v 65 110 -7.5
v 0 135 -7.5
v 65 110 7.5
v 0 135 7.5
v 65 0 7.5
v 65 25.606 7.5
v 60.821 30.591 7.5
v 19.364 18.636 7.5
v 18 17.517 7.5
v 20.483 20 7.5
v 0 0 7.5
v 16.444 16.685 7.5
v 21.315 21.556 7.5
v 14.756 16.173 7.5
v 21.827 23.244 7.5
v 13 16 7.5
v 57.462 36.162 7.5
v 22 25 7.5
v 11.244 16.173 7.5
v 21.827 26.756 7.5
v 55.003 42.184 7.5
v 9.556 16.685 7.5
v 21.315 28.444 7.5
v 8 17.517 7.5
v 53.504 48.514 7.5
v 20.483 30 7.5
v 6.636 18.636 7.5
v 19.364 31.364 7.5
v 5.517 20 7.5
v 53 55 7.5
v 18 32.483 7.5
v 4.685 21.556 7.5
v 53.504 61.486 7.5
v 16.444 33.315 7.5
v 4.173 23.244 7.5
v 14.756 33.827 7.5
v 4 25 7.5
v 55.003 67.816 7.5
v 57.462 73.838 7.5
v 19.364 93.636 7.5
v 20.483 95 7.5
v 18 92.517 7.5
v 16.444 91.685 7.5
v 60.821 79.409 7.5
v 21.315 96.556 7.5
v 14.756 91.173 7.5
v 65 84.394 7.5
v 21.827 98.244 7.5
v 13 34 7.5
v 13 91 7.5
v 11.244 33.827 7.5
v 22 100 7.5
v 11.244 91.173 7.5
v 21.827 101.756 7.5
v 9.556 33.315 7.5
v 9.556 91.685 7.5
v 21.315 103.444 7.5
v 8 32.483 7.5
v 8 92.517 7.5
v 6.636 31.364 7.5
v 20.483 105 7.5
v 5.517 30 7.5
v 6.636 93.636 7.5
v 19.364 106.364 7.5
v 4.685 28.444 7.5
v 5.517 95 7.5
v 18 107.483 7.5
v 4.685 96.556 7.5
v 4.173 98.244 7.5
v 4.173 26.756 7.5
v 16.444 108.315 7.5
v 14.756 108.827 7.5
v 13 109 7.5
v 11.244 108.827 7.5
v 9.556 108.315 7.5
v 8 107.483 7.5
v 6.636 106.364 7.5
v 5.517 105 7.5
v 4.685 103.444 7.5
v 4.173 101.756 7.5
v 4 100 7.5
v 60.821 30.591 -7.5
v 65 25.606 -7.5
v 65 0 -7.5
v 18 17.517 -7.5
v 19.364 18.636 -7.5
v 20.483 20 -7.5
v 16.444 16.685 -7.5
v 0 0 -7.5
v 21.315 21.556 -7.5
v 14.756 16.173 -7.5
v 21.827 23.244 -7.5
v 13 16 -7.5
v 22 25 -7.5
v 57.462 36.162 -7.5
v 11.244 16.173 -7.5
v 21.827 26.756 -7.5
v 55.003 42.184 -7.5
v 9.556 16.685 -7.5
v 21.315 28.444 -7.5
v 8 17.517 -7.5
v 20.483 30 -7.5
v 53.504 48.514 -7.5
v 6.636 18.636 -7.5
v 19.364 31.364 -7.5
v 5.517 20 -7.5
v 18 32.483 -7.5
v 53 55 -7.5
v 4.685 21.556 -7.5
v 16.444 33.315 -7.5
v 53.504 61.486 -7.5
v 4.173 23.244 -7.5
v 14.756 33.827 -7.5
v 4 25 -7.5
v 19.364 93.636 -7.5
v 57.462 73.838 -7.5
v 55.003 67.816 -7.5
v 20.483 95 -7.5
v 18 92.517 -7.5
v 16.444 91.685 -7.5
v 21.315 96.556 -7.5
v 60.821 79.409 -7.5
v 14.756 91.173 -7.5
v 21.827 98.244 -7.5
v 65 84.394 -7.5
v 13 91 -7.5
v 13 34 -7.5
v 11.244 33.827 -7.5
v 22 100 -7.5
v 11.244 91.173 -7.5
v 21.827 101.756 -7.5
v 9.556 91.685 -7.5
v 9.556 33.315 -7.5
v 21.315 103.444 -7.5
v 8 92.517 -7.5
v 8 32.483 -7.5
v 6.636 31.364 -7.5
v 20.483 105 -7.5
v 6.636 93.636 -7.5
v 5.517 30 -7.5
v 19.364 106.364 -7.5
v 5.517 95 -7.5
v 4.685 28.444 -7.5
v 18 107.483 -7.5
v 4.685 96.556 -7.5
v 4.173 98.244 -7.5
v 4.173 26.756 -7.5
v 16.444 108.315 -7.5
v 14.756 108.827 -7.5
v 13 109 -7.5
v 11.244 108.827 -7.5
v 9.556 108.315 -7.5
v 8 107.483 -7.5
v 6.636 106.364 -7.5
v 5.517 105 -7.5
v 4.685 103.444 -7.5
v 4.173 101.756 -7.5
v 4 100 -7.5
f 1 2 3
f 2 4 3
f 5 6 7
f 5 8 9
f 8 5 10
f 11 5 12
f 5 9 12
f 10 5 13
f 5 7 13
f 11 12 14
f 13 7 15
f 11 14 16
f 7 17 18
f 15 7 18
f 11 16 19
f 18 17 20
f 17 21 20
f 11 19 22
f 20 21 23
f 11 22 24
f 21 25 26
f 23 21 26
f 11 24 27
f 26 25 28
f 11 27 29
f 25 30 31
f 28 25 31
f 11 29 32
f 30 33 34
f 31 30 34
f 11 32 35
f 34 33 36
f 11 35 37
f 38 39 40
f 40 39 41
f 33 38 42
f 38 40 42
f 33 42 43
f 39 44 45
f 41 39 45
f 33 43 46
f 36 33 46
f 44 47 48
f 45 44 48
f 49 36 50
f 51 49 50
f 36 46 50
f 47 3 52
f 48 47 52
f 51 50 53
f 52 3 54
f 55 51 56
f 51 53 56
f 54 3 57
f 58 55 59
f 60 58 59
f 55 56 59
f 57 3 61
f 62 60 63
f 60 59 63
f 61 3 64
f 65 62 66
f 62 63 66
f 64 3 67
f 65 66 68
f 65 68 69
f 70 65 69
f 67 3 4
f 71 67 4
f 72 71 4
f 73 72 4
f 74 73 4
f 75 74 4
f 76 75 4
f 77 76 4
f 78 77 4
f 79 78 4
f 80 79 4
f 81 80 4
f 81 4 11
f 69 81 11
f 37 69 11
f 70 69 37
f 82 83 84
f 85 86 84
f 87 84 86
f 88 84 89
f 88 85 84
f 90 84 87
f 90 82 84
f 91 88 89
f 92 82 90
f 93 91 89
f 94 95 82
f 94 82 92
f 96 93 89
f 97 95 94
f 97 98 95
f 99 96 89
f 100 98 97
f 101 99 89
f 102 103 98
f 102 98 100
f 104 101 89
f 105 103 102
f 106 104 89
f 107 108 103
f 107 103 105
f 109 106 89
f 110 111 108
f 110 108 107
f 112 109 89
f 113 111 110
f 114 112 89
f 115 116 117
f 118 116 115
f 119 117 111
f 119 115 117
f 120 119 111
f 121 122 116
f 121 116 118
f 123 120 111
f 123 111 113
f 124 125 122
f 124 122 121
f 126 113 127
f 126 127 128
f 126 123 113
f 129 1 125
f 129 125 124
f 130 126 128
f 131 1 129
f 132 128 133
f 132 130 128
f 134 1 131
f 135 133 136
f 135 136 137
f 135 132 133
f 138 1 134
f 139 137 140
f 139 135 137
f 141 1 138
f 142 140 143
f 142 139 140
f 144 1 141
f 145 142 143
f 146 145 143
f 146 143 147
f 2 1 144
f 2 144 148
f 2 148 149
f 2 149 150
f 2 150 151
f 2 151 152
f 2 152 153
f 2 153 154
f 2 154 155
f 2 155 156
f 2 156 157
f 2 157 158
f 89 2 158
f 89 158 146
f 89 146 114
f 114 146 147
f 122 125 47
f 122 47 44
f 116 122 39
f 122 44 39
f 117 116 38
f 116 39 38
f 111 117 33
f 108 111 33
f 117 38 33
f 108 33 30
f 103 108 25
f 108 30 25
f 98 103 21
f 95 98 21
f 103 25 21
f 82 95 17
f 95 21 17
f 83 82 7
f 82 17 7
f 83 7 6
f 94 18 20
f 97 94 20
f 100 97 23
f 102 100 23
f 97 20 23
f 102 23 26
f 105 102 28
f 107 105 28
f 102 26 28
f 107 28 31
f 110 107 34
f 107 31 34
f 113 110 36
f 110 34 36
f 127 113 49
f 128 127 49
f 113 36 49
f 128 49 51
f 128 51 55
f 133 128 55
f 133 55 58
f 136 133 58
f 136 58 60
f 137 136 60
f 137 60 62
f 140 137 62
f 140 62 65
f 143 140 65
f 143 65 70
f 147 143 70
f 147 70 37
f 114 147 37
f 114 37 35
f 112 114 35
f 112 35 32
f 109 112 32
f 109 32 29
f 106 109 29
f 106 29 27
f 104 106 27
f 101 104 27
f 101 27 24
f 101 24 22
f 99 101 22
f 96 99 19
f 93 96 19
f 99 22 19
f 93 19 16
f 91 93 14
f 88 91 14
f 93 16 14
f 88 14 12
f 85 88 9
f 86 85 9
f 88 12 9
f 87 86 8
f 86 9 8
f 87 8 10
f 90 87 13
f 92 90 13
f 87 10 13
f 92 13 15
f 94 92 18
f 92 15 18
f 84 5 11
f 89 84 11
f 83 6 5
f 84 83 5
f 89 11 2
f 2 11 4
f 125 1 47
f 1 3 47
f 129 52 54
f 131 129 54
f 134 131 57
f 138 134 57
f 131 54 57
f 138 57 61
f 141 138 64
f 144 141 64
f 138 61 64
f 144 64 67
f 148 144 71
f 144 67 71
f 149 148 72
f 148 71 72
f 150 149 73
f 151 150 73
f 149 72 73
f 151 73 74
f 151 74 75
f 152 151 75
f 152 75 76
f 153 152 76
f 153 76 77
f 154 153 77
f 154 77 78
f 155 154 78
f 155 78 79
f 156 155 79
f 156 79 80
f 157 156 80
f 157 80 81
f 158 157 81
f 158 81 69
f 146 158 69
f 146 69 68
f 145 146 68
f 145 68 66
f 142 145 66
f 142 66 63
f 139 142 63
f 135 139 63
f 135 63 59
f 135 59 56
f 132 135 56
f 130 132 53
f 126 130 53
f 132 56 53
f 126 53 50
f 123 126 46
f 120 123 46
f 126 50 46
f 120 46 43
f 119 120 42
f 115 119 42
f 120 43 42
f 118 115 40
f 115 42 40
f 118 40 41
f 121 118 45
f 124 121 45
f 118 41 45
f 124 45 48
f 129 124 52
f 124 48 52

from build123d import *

# Parameters (mm, degrees)
Y_KSEKLIK_EKSTR_ZYON1_DEPTH = 7.5
IZIM2_R                     = 9
KES_EKSTR_ZYON1_DEPTH       = 16


with BuildPart() as part:
    # Çizim1 → Yükseklik-Ekstrüzyon1 (new body, symmetric)
    with BuildSketch(Plane.XY):
        with BuildLine():
            Line((0, 0), (0, 135))
            Line((0, 135), (65, 110))
            Line((65, 110), (65, 84.393876913))
            ThreePointArc((65, 84.393876913), (53, 55), (65, 25.606123087))
            Line((65, 25.606123087), (65, 0))
            Line((65, 0), (0, 0))
        make_face()
    extrude(amount=Y_KSEKLIK_EKSTR_ZYON1_DEPTH, both=True)

    # Çizim2 → Kes-Ekstrüzyon1 (cut, through all)
    with BuildSketch(Plane.XY.offset(7.5)):
        with Locations((13, 100)):
            Circle(IZIM2_R)
        with Locations((13, 25)):
            Circle(IZIM2_R)
    extrude(amount=-KES_EKSTR_ZYON1_DEPTH, mode=Mode.SUBTRACT)


solid = part.part
